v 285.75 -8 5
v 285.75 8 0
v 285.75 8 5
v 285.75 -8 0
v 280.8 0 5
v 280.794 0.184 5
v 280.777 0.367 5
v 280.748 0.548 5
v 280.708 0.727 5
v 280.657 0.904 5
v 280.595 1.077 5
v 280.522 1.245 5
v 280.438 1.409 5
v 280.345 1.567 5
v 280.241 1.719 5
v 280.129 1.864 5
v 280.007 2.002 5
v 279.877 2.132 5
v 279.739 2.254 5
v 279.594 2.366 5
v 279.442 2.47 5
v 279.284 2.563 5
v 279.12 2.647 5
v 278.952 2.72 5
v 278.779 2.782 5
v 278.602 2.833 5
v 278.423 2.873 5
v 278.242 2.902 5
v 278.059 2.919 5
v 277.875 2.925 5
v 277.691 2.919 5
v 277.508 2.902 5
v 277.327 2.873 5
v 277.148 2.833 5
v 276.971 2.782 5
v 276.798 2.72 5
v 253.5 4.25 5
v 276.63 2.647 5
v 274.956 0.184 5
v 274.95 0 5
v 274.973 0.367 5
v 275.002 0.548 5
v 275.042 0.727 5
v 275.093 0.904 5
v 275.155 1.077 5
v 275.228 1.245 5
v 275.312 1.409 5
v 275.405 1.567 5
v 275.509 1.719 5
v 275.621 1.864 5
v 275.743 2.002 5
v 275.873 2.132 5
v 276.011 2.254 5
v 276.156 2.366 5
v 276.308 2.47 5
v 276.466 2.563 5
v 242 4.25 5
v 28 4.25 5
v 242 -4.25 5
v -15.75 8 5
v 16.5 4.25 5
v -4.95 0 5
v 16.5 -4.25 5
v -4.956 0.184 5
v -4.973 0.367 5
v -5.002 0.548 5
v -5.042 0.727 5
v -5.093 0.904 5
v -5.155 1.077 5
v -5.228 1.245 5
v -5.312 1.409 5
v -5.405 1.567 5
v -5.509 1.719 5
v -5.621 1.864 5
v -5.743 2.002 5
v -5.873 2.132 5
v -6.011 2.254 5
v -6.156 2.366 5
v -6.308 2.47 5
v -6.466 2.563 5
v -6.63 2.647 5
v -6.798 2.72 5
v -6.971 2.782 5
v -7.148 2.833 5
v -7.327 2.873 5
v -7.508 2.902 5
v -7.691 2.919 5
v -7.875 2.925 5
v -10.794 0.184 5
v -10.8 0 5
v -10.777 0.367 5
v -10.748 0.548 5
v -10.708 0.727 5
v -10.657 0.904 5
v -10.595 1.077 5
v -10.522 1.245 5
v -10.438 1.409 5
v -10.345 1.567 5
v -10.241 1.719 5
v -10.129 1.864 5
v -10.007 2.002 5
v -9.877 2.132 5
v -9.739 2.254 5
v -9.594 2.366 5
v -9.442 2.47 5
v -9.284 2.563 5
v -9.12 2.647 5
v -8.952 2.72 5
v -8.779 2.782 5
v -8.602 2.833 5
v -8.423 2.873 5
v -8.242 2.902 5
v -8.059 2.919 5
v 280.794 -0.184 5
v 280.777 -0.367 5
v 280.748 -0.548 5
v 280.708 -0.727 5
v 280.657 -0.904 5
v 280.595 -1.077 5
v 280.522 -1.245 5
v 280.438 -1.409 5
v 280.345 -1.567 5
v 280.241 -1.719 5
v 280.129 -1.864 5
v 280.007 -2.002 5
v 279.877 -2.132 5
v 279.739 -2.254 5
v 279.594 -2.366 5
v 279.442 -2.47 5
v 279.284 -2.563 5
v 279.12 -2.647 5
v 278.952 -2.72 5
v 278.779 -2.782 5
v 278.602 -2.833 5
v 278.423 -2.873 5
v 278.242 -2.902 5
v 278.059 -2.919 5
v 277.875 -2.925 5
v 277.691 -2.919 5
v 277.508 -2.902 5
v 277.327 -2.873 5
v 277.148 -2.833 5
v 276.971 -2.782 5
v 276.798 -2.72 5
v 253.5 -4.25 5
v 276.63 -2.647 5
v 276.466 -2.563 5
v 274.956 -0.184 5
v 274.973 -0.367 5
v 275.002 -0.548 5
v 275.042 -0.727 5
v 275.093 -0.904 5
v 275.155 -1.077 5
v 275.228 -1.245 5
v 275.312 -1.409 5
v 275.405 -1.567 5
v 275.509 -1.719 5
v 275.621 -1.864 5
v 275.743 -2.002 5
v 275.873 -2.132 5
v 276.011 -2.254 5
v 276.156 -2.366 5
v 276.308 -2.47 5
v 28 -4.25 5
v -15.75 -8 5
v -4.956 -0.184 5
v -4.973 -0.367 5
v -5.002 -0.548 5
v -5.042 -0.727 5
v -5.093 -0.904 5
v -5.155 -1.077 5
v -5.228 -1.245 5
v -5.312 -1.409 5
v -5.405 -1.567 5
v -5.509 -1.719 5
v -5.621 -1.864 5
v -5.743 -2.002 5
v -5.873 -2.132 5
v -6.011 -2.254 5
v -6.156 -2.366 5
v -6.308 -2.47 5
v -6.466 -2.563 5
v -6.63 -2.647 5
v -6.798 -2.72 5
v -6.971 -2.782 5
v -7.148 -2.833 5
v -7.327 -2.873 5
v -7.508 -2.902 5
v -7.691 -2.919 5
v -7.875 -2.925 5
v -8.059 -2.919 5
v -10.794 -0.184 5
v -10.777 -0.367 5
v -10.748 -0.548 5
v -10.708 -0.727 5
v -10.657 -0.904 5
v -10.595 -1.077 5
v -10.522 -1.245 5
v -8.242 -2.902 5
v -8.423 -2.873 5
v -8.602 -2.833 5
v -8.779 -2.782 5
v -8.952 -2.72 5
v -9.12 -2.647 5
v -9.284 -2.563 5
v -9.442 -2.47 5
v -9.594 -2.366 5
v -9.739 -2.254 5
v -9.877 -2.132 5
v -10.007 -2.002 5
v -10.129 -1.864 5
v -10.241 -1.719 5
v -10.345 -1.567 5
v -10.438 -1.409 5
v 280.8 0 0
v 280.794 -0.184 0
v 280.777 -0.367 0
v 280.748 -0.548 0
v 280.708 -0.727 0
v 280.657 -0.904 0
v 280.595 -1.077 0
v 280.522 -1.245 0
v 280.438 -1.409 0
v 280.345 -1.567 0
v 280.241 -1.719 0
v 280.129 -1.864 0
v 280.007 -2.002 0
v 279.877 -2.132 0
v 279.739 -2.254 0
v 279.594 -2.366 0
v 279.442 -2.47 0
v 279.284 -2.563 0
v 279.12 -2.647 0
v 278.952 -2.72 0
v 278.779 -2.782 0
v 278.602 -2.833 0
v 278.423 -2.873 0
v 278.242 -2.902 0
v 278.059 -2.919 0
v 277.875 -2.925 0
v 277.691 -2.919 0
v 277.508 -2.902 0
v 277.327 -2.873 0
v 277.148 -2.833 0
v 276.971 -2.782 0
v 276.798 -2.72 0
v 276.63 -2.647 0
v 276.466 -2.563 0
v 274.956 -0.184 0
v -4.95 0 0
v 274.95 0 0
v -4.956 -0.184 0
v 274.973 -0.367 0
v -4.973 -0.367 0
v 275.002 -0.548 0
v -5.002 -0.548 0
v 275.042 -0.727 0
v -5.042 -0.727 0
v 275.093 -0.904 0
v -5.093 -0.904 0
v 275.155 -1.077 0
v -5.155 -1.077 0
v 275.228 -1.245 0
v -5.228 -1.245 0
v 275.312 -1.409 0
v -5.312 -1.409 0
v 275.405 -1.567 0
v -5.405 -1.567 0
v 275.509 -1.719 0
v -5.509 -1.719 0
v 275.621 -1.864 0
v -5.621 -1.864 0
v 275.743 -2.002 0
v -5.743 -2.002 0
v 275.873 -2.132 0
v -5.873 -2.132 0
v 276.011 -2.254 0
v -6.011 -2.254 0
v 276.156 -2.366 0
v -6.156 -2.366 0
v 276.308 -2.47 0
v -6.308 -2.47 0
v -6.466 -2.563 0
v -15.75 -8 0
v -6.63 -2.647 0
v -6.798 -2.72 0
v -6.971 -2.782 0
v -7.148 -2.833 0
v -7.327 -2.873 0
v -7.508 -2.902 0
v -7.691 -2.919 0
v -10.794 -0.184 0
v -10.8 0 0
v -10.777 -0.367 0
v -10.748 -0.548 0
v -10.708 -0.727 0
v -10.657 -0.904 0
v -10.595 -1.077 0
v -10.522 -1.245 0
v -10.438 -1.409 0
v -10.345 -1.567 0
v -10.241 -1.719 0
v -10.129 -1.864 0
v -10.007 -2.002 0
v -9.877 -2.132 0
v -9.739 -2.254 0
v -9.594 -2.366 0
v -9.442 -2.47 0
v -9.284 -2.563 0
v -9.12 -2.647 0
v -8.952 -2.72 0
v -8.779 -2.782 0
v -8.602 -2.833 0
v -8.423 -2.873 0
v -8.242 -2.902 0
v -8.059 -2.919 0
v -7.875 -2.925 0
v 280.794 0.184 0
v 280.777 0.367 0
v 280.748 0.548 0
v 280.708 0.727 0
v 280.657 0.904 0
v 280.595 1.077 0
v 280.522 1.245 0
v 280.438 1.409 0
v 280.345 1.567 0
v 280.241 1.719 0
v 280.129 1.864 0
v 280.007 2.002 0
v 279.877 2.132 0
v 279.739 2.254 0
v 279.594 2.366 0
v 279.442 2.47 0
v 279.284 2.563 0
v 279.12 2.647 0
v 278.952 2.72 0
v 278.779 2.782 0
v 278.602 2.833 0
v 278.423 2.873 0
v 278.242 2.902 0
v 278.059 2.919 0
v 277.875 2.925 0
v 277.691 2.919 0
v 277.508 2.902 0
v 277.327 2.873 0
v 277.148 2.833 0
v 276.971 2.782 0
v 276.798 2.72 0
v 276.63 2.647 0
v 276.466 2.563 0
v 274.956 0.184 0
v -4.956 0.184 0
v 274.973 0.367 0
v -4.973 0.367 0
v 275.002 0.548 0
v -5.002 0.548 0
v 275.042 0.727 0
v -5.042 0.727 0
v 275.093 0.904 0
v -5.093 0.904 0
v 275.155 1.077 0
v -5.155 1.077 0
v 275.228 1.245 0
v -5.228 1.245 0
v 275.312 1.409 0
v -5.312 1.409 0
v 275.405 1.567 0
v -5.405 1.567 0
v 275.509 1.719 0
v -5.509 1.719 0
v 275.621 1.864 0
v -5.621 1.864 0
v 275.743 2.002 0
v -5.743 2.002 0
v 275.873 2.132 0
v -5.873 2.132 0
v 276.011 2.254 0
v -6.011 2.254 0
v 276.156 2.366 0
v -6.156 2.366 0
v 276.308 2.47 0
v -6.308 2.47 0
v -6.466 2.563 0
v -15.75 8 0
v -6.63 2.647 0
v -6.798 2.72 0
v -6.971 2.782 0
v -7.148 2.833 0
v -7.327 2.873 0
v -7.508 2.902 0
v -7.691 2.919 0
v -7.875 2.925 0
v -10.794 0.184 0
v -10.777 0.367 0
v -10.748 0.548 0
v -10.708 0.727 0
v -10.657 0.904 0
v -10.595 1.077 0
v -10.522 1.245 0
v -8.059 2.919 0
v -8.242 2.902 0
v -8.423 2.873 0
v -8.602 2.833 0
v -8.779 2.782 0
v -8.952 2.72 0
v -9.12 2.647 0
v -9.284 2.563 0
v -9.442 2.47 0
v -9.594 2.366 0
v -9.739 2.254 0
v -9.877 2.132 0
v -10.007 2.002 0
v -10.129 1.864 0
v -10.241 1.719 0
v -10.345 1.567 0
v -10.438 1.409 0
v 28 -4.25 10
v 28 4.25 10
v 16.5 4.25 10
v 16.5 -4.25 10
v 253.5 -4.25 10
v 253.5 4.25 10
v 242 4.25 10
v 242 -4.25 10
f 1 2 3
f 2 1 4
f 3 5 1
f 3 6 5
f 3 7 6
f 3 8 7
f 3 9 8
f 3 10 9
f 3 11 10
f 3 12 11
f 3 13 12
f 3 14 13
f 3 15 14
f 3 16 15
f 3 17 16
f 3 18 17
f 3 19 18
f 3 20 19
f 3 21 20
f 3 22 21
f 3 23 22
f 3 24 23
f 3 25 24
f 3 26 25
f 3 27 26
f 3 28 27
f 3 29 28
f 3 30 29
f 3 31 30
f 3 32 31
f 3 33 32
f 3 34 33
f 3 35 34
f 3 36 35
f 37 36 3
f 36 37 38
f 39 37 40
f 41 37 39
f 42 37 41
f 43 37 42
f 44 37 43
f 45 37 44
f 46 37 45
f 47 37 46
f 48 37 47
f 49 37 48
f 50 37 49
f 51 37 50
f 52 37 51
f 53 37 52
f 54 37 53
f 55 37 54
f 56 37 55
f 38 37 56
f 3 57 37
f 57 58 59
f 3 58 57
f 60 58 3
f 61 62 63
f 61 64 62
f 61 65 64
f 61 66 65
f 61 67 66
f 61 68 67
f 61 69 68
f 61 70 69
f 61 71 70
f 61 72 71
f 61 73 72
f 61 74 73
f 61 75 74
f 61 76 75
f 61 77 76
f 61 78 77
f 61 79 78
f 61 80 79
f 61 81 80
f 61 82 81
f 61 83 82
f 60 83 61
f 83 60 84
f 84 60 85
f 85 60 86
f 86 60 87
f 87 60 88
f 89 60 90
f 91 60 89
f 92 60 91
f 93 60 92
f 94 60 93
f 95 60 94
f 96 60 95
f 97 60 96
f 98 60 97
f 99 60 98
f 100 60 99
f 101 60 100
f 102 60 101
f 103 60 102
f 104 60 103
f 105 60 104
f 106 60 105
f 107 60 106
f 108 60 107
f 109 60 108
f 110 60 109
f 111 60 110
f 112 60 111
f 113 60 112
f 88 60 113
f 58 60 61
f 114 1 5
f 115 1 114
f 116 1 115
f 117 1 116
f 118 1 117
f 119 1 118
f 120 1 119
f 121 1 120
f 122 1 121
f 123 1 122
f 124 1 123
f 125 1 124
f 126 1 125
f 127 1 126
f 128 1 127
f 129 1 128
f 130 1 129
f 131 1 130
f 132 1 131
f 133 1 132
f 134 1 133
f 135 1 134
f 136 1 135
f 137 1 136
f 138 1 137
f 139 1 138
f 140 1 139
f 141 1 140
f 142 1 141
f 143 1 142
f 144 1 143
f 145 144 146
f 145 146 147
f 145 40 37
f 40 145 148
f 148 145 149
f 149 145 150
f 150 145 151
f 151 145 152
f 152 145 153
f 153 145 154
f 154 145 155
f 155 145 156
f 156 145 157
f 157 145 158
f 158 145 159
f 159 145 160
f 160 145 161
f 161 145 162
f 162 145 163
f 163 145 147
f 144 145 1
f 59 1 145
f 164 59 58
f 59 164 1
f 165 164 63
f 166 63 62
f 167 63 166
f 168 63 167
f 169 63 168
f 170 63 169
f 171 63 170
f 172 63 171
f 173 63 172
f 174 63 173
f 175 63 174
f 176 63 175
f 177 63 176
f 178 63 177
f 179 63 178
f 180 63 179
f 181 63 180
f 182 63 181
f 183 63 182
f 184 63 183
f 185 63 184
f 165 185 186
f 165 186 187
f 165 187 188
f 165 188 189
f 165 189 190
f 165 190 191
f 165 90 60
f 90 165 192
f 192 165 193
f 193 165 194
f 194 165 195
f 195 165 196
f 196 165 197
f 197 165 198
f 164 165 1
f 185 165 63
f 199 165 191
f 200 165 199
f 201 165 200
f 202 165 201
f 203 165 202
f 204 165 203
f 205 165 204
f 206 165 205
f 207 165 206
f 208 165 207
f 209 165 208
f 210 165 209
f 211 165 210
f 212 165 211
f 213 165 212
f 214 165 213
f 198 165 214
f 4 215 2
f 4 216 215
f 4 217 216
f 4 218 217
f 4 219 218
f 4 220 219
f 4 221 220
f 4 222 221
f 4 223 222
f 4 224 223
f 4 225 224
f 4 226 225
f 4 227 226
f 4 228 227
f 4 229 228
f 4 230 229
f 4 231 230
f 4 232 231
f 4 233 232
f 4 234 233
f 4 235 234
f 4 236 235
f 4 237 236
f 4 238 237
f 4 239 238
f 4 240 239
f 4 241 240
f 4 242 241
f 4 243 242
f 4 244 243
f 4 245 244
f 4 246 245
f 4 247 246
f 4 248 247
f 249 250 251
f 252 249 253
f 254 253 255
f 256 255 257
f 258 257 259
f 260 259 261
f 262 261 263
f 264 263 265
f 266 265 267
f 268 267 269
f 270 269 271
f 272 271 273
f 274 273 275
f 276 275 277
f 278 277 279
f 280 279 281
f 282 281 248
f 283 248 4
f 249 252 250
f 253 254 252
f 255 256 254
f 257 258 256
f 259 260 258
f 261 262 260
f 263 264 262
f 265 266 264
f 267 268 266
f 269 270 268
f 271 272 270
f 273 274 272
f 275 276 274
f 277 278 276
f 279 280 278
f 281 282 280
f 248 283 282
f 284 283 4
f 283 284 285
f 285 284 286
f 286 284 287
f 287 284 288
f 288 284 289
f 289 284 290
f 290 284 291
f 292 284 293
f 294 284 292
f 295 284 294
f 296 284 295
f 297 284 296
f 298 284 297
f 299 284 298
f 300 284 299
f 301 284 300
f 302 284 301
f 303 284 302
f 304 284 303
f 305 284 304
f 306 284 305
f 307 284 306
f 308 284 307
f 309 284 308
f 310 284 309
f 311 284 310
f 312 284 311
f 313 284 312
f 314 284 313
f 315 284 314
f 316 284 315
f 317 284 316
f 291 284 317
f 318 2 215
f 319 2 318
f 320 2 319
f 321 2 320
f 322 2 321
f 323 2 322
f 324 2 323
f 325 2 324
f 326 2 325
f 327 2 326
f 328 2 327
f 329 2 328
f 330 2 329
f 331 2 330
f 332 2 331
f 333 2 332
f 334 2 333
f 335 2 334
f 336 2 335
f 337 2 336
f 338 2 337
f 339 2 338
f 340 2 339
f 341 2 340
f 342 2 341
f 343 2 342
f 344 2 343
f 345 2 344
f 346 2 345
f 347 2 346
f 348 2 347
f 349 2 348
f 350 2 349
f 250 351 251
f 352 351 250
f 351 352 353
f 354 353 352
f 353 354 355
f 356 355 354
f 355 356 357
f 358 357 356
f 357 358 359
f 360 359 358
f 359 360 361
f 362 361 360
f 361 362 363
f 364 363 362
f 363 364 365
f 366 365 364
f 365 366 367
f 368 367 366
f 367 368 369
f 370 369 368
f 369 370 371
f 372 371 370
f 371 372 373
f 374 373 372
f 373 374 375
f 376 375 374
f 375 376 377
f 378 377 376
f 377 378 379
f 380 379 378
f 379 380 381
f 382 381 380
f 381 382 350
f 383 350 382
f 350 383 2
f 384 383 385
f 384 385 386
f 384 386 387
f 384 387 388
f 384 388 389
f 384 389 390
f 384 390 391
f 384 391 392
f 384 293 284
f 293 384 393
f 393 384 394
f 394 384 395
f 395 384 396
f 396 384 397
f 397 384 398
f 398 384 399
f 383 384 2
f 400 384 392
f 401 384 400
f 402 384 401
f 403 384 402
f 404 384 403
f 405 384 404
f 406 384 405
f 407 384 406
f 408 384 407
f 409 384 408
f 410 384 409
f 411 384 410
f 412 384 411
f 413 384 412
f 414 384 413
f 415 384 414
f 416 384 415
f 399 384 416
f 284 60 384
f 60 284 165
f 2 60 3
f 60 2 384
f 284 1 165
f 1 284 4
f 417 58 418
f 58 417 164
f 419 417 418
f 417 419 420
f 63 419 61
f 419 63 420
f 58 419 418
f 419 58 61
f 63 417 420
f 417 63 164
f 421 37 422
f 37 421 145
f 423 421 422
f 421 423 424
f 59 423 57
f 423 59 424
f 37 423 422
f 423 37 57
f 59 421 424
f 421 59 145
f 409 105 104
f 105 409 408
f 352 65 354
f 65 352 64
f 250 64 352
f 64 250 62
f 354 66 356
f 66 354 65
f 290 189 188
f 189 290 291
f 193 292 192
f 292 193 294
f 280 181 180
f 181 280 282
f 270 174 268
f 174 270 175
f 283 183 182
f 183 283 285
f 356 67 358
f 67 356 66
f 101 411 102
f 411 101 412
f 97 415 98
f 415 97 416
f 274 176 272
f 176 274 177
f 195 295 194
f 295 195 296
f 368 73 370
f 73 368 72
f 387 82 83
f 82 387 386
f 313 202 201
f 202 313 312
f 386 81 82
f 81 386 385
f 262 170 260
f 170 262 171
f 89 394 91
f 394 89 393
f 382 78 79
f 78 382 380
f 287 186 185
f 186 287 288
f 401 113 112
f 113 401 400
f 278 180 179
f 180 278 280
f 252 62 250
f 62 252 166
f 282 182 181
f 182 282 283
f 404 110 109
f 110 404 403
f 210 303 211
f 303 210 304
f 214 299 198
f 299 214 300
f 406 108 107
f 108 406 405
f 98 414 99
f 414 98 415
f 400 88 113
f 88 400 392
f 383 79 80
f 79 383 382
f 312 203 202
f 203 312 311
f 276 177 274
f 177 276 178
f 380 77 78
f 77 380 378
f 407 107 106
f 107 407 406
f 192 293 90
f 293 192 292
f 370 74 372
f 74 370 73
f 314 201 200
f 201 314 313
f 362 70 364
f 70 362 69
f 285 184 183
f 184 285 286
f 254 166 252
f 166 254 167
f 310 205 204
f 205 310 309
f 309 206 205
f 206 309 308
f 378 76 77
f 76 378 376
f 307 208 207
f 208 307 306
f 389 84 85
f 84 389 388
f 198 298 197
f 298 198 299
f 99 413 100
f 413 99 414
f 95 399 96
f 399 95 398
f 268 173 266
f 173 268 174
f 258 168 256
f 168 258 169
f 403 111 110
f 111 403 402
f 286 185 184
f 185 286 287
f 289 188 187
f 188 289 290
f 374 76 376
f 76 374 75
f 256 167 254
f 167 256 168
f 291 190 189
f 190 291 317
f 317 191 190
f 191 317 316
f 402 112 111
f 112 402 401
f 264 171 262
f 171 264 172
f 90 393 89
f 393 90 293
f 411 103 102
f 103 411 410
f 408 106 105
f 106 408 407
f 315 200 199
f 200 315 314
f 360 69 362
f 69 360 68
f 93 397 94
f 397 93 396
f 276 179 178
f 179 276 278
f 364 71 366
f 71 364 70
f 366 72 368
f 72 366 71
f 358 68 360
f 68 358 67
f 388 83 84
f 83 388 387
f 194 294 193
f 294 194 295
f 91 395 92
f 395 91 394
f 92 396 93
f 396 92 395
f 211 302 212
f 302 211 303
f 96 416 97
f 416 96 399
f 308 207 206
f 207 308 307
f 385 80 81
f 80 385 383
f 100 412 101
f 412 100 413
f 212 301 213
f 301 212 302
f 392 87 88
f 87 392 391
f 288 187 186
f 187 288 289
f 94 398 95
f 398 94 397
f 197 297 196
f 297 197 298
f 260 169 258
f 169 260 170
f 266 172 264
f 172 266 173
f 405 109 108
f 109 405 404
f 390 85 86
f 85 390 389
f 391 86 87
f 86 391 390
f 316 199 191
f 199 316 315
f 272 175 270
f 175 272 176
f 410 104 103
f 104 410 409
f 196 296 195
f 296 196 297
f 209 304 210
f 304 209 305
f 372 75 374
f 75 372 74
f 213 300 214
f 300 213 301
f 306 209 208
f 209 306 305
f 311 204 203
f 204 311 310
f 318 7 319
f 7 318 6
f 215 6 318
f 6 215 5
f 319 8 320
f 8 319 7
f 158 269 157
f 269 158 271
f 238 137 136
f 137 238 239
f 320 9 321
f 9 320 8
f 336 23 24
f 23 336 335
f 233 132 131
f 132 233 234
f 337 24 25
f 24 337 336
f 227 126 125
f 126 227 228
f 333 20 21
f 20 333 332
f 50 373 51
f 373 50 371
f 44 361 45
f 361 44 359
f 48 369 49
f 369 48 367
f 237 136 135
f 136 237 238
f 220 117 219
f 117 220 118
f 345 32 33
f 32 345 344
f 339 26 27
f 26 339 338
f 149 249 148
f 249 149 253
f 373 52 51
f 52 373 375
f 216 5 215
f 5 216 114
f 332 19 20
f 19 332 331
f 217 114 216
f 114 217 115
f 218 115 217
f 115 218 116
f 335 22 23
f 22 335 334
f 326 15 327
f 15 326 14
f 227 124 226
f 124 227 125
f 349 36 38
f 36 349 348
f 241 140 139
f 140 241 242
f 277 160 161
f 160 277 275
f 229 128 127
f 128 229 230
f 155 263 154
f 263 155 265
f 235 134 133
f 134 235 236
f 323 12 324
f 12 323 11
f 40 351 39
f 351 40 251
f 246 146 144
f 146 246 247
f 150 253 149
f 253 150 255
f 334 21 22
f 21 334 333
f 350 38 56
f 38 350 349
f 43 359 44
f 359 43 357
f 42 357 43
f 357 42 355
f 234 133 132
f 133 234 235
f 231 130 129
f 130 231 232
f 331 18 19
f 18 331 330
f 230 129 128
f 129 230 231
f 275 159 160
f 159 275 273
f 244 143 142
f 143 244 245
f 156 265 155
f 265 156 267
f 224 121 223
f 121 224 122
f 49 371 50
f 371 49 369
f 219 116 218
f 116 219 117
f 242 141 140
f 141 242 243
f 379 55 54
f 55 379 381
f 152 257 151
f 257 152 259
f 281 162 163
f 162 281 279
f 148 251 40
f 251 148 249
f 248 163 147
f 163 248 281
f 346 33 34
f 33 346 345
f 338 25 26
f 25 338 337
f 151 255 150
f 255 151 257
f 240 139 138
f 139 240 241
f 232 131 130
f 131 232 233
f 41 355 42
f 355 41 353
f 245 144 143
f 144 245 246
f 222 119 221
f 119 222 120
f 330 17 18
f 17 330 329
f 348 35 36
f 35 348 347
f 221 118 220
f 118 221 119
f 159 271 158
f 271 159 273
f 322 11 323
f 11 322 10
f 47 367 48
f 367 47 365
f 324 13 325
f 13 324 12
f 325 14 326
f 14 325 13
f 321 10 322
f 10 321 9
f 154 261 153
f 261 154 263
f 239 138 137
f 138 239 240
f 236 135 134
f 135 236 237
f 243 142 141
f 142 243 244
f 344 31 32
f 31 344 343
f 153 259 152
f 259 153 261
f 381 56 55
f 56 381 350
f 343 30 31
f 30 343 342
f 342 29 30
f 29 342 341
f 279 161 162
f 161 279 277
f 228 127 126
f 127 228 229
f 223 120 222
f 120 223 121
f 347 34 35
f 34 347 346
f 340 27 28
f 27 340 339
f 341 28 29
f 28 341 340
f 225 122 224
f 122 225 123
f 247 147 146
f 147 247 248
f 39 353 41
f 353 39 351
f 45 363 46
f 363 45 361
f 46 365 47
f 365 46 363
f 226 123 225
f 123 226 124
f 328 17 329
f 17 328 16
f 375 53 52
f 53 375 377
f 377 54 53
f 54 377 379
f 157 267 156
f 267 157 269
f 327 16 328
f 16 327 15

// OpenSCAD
// file: strip-wire-lib.scad
module stripWireCuts(wireLength=10,stripInLength=5,stripOutLength=5) {
    translate([stripInLength - toolR, -toolWidth - (wireD / 2)]) {
        square([toolWidth, 2 * toolWidth + wireD]);
    }

    translate([stripInLength + wireLength - toolR, -toolWidth - (wireD / 2)]) {
        square([toolWidth, 2 * toolWidth + wireD]);
    }
}

module cutWireCuts(wireLength=10, stripInLength=5,stripOutLength=5) {
    translate([wireLength + stripInLength + stripOutLength, -toolWidth / 2]) {
        square([toolWidth, toolWidth]);
    }
}
// file: strip-wire-measurements.scad
stripLength = 5.2;
toolWidth = 1.5;
toolR = toolWidth / 2;
wireD = 3;
wireLength = 40;
stockLength = 270;
wallThickness = 5;
boltM=3;
sheetThickness = 3;
tThreadM=5.75;
tSlotWidth=8.5;
tSlotDepth=5;
// main file
include <strip-wire-measurements.scad>
include <strip-wire-lib.scad>

paddingWidth = wallThickness * 2 + 2 * toolWidth;
holdWidth = paddingWidth + wireD;

$fn=100;

difference() {
    union() {
        translate([ - wallThickness - wallThickness - tThreadM, - wallThickness - toolWidth - (wireD / 2)]) {
            cube([wallThickness * 4 + 2 * tThreadM + stockLength, holdWidth,wallThickness]);
        }
        translate([tThreadM * 2 + wallThickness, -tSlotWidth / 2, wallThickness]) {
            cube([tThreadM * 2, tSlotWidth, tSlotDepth]);  
        }

        translate([stockLength - (tThreadM * 2 + wallThickness) - tThreadM * 2, -tSlotWidth / 2, wallThickness]) {
            cube([tThreadM * 2, tSlotWidth, tSlotDepth]);  
        }
    }

    translate([-wallThickness - tThreadM / 2, 0, -0.01]) {
        cylinder(r=tThreadM/2+0.05,h=wallThickness + 0.03);
    }

    translate([stockLength + wallThickness + tThreadM / 2, 0, -0.01]) {
        cylinder(r=tThreadM/2+0.05,h=wallThickness + 0.03);
    }
}
